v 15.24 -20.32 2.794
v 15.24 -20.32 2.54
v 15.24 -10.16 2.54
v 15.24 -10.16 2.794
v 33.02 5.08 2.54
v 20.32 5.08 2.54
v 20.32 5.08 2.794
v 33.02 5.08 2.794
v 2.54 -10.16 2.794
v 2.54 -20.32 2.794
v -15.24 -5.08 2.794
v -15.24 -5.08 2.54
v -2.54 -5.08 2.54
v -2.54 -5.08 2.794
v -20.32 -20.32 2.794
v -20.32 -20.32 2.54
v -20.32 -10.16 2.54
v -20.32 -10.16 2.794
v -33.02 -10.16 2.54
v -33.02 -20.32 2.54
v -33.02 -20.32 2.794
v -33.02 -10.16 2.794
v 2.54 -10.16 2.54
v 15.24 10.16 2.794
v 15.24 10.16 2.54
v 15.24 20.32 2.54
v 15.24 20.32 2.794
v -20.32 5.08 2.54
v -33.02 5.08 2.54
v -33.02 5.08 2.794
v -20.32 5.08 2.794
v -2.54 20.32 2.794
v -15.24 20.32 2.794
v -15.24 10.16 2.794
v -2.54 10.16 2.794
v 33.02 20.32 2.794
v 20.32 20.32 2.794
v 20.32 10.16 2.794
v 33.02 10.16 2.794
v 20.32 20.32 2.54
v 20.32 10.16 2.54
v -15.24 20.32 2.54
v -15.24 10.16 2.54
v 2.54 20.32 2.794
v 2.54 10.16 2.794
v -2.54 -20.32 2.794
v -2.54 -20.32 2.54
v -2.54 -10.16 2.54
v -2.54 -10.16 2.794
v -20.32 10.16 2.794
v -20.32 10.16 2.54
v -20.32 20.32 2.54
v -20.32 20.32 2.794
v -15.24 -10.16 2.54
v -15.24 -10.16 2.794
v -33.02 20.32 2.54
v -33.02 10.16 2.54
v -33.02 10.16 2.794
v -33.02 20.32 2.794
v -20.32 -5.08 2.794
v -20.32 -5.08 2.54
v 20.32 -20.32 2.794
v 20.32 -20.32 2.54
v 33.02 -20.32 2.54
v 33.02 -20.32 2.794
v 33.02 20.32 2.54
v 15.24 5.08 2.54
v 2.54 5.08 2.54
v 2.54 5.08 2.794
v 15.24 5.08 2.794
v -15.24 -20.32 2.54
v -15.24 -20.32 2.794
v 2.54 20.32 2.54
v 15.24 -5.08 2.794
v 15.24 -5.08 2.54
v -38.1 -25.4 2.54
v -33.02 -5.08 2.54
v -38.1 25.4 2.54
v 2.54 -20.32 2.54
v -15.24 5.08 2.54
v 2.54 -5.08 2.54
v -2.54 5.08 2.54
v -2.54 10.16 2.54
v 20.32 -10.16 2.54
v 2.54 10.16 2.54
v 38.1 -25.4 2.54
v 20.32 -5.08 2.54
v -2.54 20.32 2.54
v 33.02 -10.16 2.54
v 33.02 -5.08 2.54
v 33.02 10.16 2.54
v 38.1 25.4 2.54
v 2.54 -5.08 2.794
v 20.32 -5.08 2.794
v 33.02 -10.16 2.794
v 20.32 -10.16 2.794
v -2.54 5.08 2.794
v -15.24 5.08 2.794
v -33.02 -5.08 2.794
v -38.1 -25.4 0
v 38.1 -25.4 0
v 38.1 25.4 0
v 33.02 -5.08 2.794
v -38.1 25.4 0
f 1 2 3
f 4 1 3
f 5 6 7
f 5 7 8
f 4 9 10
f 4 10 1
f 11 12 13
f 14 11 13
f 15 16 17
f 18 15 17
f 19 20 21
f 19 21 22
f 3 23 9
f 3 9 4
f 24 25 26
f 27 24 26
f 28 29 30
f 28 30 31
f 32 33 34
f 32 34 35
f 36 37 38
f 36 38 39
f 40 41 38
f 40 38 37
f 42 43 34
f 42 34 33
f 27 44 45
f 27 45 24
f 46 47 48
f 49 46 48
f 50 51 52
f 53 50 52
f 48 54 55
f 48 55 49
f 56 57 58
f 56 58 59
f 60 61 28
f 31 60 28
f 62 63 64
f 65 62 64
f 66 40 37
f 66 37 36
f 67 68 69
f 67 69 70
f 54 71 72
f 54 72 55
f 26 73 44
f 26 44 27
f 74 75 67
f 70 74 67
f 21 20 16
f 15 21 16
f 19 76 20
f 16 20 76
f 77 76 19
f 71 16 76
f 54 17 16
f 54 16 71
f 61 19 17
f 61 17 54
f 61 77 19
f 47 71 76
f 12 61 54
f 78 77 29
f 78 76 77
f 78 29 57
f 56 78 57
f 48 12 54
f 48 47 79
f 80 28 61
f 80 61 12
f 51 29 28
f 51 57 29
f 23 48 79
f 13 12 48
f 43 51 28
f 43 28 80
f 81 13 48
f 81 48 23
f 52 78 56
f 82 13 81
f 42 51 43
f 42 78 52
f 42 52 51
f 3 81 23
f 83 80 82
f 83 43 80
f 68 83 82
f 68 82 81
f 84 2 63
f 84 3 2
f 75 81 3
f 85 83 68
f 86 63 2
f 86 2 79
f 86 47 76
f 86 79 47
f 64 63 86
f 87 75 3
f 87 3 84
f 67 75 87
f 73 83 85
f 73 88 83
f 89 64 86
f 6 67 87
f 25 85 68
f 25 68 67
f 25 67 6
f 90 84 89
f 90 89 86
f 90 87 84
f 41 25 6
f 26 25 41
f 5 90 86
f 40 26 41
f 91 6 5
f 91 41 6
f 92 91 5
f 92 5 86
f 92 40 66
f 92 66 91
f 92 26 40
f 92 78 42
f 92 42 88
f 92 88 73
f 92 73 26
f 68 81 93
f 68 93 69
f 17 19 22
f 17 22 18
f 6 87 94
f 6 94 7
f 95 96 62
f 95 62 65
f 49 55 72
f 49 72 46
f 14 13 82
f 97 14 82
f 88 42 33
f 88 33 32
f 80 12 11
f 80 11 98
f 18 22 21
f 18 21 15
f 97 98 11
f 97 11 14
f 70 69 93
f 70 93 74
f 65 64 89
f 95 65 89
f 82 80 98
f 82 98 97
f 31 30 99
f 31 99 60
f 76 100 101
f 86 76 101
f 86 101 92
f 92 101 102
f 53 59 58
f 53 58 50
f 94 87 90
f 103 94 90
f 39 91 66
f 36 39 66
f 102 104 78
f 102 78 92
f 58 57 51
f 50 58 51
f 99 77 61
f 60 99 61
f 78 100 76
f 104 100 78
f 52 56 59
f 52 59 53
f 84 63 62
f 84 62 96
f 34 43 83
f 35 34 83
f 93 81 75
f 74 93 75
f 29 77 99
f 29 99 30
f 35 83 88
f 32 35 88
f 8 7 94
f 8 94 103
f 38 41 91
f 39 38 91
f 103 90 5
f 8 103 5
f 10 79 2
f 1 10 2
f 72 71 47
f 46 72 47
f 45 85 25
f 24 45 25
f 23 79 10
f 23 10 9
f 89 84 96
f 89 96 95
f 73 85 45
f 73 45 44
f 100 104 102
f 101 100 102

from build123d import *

# Parameters (mm, degrees)
SKETCH1_W            = 76.2
SKETCH1_H            = 50.8
BOSS_EXTRUDE2_DEPTH  = 2.54
SKETCH3_W            = 12.7
SKETCH3_H            = 10.16
BOSS_EXTRUDE3_DEPTH  = 0.254
LPATTERN2_COUNT      = 4
LPATTERN2_PITCH      = 17.78
LPATTERN2_COUNT_DIR2 = 3
LPATTERN2_PITCH_DIR2 = 15.24


with BuildPart() as part:
    # Sketch1 → Boss-Extrude2 (new body)
    with BuildSketch(Plane.XY):
        Rectangle(SKETCH1_W, SKETCH1_H)
    extrude(amount=BOSS_EXTRUDE2_DEPTH)

    # Sketch3 → Boss-Extrude3 (add)
    with BuildSketch(Plane.XY.offset(2.54)):
        with Locations((-26.67, 15.24)):
            Rectangle(SKETCH3_W, SKETCH3_H)
    boss_extrude3 = extrude(amount=BOSS_EXTRUDE3_DEPTH)

    # LPattern2: Boss-Extrude3 4 × 3
    with Locations(*[(i * LPATTERN2_PITCH, -j * LPATTERN2_PITCH_DIR2, 0) for i in range(LPATTERN2_COUNT) for j in range(LPATTERN2_COUNT_DIR2) if (i, j) != (0, 0)]):
        add(boss_extrude3)


solid = part.part
